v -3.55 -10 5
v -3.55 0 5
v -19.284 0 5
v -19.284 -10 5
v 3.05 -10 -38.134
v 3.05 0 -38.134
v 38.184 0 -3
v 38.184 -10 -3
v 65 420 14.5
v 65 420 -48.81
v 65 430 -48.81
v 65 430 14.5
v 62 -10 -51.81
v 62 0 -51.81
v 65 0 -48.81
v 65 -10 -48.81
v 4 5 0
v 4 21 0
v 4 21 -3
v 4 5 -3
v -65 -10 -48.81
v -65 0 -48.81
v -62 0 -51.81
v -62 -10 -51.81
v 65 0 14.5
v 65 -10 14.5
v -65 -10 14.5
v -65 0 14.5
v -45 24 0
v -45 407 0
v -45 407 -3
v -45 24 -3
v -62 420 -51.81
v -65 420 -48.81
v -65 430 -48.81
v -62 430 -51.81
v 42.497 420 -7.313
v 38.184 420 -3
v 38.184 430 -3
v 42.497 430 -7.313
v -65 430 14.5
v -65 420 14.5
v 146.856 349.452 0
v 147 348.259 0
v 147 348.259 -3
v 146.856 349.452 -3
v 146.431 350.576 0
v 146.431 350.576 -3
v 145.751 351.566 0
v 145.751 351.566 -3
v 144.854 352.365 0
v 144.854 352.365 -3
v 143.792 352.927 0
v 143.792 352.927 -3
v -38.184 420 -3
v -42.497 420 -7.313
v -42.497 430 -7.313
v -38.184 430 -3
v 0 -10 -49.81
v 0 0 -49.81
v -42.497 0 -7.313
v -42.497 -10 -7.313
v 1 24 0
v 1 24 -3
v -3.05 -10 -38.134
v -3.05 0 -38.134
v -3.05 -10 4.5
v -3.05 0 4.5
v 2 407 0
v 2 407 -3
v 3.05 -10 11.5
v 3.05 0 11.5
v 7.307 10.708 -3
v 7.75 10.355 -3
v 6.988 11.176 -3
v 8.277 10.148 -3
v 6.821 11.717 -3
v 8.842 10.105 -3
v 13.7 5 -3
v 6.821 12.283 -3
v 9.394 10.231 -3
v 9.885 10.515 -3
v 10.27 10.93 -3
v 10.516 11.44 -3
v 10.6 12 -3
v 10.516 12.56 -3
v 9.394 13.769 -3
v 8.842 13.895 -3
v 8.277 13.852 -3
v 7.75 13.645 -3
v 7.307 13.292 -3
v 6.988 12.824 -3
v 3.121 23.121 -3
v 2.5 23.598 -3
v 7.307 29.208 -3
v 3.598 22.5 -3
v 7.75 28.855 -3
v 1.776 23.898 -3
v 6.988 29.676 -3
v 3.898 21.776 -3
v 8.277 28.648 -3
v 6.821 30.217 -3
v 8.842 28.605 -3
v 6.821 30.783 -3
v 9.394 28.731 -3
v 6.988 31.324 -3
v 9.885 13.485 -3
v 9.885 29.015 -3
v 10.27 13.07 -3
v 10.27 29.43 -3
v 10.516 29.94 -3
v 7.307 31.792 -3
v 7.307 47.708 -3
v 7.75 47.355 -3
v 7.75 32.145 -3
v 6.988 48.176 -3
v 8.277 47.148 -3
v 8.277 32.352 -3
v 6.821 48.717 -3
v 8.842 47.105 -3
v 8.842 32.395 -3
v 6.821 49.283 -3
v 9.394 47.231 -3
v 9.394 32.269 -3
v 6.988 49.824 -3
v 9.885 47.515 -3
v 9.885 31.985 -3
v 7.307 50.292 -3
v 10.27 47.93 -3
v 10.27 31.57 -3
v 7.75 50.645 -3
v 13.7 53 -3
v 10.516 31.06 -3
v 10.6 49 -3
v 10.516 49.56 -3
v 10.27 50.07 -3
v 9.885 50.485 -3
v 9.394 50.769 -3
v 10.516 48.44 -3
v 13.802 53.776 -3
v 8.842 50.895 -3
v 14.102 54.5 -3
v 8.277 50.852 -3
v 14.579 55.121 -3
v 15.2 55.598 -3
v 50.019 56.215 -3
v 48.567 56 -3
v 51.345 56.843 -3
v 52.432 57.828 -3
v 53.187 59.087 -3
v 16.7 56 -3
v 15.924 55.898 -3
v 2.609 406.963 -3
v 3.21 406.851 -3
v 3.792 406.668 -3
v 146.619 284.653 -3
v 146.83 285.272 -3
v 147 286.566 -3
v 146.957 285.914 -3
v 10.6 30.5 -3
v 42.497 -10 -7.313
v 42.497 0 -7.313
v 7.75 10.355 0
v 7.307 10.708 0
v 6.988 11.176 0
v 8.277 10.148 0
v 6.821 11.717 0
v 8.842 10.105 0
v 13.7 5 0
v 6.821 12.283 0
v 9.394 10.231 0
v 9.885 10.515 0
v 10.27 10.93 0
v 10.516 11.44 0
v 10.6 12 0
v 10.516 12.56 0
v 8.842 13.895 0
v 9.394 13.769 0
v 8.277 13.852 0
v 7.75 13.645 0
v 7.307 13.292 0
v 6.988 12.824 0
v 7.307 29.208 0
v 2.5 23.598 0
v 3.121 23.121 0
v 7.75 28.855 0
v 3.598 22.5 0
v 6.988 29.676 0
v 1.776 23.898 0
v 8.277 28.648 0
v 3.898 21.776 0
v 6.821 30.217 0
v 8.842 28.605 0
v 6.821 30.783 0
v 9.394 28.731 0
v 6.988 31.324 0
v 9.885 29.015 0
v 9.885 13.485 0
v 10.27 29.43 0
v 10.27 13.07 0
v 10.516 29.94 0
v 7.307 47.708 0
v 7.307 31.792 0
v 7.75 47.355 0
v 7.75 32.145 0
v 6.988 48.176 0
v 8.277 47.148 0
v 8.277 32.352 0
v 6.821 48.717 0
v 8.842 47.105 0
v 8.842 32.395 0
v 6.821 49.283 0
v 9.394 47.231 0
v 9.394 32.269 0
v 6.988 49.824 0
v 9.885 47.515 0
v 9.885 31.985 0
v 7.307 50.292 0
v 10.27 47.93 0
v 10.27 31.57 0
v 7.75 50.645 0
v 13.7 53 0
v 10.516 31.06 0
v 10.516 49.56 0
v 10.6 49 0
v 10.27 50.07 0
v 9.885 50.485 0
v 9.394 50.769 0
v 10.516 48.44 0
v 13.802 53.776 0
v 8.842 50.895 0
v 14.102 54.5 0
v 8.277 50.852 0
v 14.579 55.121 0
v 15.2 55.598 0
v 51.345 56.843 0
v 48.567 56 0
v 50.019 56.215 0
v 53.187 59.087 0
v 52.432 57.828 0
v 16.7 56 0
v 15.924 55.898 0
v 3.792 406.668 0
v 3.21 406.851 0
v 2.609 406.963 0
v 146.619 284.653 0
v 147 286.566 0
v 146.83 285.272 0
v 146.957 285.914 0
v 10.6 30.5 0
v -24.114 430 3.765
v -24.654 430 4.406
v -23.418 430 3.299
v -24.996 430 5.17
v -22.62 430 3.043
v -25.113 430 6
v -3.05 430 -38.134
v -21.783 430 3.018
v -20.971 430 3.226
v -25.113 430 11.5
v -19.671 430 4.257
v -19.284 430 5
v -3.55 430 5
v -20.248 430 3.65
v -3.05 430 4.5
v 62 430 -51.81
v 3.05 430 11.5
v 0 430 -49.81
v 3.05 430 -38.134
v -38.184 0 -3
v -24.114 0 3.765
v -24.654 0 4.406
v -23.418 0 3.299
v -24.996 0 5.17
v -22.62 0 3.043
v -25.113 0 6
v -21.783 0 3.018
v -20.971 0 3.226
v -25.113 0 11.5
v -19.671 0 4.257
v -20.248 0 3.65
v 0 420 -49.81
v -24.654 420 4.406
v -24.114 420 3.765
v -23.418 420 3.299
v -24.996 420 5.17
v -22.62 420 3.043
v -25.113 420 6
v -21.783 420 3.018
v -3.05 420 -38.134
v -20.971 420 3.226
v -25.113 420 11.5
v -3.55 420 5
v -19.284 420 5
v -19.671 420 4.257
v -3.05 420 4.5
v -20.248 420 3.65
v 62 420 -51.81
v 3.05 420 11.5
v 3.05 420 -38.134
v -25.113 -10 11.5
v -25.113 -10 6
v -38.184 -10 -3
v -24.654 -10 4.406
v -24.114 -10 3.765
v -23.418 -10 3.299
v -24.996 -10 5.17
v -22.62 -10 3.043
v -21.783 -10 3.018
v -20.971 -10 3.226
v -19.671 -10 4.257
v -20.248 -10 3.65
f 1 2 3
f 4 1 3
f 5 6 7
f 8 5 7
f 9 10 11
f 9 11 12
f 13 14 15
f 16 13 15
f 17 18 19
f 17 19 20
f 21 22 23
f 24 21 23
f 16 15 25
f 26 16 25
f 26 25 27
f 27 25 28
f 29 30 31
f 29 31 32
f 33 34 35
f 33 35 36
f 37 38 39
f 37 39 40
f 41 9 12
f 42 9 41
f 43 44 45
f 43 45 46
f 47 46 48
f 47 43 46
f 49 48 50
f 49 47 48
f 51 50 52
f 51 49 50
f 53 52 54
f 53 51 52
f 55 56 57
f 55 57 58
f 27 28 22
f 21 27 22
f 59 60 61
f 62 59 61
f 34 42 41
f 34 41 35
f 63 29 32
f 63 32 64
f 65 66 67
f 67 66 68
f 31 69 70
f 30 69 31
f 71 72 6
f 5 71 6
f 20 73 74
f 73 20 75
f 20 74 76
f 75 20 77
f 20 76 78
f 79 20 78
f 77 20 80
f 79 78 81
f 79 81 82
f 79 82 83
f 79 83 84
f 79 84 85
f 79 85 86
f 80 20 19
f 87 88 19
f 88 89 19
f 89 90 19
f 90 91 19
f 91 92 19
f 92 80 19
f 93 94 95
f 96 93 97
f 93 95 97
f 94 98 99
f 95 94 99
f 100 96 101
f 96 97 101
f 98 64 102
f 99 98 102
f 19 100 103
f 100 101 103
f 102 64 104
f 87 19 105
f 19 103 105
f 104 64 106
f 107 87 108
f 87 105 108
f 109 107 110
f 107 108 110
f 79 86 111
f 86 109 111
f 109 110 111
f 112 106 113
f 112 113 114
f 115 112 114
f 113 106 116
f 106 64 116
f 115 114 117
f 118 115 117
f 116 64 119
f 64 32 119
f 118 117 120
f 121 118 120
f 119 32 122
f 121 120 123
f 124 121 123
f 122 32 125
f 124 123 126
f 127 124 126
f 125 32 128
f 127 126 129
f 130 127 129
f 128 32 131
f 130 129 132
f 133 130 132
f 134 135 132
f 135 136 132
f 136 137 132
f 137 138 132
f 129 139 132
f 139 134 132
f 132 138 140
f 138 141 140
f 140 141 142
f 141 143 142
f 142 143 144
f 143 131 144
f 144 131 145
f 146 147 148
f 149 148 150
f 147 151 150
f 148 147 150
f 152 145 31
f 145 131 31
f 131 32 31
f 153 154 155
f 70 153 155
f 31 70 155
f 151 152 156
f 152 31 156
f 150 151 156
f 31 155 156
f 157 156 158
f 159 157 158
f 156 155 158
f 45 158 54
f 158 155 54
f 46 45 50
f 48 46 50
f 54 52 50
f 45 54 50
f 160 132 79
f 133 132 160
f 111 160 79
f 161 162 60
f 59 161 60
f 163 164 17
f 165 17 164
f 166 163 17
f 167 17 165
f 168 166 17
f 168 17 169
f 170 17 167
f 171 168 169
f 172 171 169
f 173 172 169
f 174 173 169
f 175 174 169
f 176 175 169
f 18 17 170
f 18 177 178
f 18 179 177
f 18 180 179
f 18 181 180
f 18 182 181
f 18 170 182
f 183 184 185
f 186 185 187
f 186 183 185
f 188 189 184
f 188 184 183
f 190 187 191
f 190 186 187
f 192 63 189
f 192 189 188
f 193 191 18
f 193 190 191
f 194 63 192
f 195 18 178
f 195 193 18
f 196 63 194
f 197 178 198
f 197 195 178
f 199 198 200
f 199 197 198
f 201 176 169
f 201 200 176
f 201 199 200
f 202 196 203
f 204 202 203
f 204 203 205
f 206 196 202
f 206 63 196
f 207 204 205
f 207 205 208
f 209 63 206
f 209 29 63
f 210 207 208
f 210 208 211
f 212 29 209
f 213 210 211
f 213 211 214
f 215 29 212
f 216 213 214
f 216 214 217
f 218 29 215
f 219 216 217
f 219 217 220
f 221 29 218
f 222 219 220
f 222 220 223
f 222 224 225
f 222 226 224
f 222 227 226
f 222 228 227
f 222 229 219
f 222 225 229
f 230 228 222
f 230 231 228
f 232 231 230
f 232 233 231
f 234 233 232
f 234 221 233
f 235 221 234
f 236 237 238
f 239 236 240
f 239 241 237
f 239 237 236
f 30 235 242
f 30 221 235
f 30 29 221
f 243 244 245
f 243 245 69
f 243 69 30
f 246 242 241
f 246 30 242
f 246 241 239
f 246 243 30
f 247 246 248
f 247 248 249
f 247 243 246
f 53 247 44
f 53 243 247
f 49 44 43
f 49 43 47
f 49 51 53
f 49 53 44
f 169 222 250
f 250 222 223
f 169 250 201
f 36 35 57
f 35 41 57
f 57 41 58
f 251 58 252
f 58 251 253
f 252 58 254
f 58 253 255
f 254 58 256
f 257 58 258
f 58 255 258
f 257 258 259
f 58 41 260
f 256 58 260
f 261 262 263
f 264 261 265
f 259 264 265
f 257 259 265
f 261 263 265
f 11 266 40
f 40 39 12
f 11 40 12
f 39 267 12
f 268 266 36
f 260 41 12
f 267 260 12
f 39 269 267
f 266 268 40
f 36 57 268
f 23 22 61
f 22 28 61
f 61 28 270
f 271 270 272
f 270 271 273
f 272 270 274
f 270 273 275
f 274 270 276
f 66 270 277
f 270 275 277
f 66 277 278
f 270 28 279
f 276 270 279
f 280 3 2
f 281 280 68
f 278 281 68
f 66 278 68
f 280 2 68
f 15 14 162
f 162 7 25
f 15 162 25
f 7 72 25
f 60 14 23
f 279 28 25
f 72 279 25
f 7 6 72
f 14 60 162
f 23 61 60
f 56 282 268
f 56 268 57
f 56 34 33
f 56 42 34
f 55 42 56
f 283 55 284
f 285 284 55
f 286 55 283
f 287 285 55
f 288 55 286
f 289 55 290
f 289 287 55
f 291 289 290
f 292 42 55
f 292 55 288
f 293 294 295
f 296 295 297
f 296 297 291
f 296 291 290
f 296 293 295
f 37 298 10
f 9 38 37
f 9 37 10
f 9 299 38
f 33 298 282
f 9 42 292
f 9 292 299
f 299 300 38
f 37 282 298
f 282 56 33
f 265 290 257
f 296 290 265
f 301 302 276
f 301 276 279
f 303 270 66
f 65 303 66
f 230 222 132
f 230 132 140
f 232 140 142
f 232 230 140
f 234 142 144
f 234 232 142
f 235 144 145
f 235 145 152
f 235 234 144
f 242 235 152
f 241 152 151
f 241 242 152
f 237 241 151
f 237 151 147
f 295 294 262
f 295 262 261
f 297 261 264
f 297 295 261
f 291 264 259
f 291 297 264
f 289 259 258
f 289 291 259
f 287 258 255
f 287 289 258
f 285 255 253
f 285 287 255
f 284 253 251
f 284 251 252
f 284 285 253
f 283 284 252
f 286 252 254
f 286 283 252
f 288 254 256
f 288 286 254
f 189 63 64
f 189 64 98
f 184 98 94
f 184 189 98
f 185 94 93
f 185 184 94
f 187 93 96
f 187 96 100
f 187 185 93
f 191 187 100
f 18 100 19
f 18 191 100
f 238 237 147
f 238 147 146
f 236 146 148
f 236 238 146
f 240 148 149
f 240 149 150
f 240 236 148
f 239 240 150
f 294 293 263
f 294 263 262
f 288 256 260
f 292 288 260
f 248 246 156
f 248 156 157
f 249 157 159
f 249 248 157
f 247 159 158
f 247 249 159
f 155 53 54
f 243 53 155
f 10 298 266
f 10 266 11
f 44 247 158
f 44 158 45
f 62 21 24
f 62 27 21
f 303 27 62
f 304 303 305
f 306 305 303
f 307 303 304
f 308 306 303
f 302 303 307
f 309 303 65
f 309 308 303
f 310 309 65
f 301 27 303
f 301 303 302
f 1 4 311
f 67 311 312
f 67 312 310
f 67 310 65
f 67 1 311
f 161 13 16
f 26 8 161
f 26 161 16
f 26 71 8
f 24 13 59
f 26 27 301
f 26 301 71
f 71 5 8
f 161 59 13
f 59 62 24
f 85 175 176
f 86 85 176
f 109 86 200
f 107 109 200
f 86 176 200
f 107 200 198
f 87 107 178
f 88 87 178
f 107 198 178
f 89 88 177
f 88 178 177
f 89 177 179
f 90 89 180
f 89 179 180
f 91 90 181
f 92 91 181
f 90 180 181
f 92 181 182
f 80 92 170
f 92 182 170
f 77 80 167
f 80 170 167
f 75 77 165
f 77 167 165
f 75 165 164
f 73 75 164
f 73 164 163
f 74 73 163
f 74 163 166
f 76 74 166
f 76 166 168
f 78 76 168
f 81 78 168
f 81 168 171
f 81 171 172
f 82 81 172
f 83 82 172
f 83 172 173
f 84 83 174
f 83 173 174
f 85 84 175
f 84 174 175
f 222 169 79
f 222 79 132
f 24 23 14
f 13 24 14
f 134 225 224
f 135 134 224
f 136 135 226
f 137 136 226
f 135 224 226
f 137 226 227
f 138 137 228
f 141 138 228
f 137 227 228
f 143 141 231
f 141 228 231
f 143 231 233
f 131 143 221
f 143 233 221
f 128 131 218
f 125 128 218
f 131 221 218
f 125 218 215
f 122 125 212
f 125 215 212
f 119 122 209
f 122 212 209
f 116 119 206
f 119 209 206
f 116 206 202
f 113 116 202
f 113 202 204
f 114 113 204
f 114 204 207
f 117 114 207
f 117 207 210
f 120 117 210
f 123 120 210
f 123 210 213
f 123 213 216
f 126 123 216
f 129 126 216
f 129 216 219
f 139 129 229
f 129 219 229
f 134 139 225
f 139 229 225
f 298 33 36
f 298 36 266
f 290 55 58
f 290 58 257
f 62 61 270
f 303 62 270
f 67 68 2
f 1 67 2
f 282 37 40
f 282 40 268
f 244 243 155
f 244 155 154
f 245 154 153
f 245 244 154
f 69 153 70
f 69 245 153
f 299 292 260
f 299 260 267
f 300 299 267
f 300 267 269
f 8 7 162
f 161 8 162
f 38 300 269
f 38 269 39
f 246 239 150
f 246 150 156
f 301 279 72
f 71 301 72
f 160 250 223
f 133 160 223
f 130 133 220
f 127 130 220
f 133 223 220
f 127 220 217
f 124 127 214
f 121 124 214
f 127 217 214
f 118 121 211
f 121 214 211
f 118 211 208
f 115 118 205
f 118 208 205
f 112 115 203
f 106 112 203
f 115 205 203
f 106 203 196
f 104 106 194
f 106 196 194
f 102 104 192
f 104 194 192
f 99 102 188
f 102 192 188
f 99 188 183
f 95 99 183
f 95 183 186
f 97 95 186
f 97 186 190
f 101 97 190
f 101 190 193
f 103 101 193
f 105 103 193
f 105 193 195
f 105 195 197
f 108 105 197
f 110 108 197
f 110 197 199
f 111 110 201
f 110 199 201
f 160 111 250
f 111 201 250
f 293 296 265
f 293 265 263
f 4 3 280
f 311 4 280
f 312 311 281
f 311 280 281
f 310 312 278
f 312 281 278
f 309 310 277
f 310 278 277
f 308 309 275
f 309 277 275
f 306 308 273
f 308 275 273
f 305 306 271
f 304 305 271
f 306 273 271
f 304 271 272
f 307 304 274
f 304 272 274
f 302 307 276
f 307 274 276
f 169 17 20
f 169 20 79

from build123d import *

# Parameters (mm, degrees)
F2_DEPTH = 10
F0_R     = 1.9
F5_DEPTH = 3


with BuildPart() as f2:
    # F1 (on Front) → F2 (new body)
    with BuildSketch(Plane.XZ):
        Polygon((-65, -48.810469), (-62, -51.810469), (62, -51.810469), (65, -48.810469), (65, 14.5), (-65, 14.5), align=None)
        with BuildLine():
            Line((3.05, 5), (3.05, -38.133766))
            Line((3.05, -38.133766), (38.183766, -3))
            Line((38.183766, -3), (42.497118, -7.313351))
            Line((42.497118, -7.313351), (0, -49.810469))
            Line((0, -49.810469), (-42.497118, -7.313351))
            Line((-42.497118, -7.313351), (-38.183766, -3))
            Line((-38.183766, -3), (-3.05, -38.133766))
            Line((-3.05, -38.133766), (-3.05, 4.5))
            Line((-3.05, 4.5), (-3.55, 5))
            Line((-3.55, 5), (-19.284271, 5))
            ThreePointArc((-19.284271, 5), (-22.620004, 3.043204), (-25.112698, 6))
            Line((-25.112698, 6), (-25.112698, 11.5))
            Line((-25.112698, 11.5), (3.05, 11.5))
            Line((3.05, 11.5), (3.05, 5))
        make_face(mode=Mode.SUBTRACT)
    extrude(amount=F2_DEPTH)


with BuildPart() as f4_1:
    # F4: instance of F2
    add(f2.part.mirror(Plane.XZ.offset(-210)))


with BuildPart() as f5:
    # F0 (on Top) → F5 (new body)
    with BuildSketch(Plane.XY):
        with BuildLine():
            ThreePointArc((48.567437, 56), (51.345288, 56.842652), (53.186834, 59.086583))
            Line((53.186834, 59.086583), (146.619398, 284.652744))
            ThreePointArc((146.619398, 284.652744), (146.903926, 285.59071), (147, 286.566161))
            Line((147, 286.566161), (147, 348.259035))
            ThreePointArc((147, 348.259035), (146.120631, 351.091066), (143.79184, 352.926937))
            Line((143.79184, 352.926937), (3.79184, 406.667902))
            ThreePointArc((3.79184, 406.667902), (2.911178, 406.916275), (2, 407))
            Line((2, 407), (-45, 407))
            Line((-45, 407), (-45, 24))
            Line((-45, 24), (1, 24))
            ThreePointArc((1, 24), (3.12132, 23.12132), (4, 21))
            Line((4, 21), (4, 5))
            Line((4, 5), (13.7, 5))
            Line((13.7, 5), (13.7, 53))
            ThreePointArc((13.7, 53), (14.578679, 55.12132), (16.7, 56))
            Line((16.7, 56), (48.567437, 56))
        make_face()
        with Locations((8.7, 12)):
            Circle(F0_R, mode=Mode.SUBTRACT)
        with Locations((8.7, 30.5)):
            Circle(F0_R, mode=Mode.SUBTRACT)
        with Locations((8.7, 49)):
            Circle(F0_R, mode=Mode.SUBTRACT)
    extrude(amount=-F5_DEPTH)


solid = Compound([f2.part, f4_1.part, f5.part])
